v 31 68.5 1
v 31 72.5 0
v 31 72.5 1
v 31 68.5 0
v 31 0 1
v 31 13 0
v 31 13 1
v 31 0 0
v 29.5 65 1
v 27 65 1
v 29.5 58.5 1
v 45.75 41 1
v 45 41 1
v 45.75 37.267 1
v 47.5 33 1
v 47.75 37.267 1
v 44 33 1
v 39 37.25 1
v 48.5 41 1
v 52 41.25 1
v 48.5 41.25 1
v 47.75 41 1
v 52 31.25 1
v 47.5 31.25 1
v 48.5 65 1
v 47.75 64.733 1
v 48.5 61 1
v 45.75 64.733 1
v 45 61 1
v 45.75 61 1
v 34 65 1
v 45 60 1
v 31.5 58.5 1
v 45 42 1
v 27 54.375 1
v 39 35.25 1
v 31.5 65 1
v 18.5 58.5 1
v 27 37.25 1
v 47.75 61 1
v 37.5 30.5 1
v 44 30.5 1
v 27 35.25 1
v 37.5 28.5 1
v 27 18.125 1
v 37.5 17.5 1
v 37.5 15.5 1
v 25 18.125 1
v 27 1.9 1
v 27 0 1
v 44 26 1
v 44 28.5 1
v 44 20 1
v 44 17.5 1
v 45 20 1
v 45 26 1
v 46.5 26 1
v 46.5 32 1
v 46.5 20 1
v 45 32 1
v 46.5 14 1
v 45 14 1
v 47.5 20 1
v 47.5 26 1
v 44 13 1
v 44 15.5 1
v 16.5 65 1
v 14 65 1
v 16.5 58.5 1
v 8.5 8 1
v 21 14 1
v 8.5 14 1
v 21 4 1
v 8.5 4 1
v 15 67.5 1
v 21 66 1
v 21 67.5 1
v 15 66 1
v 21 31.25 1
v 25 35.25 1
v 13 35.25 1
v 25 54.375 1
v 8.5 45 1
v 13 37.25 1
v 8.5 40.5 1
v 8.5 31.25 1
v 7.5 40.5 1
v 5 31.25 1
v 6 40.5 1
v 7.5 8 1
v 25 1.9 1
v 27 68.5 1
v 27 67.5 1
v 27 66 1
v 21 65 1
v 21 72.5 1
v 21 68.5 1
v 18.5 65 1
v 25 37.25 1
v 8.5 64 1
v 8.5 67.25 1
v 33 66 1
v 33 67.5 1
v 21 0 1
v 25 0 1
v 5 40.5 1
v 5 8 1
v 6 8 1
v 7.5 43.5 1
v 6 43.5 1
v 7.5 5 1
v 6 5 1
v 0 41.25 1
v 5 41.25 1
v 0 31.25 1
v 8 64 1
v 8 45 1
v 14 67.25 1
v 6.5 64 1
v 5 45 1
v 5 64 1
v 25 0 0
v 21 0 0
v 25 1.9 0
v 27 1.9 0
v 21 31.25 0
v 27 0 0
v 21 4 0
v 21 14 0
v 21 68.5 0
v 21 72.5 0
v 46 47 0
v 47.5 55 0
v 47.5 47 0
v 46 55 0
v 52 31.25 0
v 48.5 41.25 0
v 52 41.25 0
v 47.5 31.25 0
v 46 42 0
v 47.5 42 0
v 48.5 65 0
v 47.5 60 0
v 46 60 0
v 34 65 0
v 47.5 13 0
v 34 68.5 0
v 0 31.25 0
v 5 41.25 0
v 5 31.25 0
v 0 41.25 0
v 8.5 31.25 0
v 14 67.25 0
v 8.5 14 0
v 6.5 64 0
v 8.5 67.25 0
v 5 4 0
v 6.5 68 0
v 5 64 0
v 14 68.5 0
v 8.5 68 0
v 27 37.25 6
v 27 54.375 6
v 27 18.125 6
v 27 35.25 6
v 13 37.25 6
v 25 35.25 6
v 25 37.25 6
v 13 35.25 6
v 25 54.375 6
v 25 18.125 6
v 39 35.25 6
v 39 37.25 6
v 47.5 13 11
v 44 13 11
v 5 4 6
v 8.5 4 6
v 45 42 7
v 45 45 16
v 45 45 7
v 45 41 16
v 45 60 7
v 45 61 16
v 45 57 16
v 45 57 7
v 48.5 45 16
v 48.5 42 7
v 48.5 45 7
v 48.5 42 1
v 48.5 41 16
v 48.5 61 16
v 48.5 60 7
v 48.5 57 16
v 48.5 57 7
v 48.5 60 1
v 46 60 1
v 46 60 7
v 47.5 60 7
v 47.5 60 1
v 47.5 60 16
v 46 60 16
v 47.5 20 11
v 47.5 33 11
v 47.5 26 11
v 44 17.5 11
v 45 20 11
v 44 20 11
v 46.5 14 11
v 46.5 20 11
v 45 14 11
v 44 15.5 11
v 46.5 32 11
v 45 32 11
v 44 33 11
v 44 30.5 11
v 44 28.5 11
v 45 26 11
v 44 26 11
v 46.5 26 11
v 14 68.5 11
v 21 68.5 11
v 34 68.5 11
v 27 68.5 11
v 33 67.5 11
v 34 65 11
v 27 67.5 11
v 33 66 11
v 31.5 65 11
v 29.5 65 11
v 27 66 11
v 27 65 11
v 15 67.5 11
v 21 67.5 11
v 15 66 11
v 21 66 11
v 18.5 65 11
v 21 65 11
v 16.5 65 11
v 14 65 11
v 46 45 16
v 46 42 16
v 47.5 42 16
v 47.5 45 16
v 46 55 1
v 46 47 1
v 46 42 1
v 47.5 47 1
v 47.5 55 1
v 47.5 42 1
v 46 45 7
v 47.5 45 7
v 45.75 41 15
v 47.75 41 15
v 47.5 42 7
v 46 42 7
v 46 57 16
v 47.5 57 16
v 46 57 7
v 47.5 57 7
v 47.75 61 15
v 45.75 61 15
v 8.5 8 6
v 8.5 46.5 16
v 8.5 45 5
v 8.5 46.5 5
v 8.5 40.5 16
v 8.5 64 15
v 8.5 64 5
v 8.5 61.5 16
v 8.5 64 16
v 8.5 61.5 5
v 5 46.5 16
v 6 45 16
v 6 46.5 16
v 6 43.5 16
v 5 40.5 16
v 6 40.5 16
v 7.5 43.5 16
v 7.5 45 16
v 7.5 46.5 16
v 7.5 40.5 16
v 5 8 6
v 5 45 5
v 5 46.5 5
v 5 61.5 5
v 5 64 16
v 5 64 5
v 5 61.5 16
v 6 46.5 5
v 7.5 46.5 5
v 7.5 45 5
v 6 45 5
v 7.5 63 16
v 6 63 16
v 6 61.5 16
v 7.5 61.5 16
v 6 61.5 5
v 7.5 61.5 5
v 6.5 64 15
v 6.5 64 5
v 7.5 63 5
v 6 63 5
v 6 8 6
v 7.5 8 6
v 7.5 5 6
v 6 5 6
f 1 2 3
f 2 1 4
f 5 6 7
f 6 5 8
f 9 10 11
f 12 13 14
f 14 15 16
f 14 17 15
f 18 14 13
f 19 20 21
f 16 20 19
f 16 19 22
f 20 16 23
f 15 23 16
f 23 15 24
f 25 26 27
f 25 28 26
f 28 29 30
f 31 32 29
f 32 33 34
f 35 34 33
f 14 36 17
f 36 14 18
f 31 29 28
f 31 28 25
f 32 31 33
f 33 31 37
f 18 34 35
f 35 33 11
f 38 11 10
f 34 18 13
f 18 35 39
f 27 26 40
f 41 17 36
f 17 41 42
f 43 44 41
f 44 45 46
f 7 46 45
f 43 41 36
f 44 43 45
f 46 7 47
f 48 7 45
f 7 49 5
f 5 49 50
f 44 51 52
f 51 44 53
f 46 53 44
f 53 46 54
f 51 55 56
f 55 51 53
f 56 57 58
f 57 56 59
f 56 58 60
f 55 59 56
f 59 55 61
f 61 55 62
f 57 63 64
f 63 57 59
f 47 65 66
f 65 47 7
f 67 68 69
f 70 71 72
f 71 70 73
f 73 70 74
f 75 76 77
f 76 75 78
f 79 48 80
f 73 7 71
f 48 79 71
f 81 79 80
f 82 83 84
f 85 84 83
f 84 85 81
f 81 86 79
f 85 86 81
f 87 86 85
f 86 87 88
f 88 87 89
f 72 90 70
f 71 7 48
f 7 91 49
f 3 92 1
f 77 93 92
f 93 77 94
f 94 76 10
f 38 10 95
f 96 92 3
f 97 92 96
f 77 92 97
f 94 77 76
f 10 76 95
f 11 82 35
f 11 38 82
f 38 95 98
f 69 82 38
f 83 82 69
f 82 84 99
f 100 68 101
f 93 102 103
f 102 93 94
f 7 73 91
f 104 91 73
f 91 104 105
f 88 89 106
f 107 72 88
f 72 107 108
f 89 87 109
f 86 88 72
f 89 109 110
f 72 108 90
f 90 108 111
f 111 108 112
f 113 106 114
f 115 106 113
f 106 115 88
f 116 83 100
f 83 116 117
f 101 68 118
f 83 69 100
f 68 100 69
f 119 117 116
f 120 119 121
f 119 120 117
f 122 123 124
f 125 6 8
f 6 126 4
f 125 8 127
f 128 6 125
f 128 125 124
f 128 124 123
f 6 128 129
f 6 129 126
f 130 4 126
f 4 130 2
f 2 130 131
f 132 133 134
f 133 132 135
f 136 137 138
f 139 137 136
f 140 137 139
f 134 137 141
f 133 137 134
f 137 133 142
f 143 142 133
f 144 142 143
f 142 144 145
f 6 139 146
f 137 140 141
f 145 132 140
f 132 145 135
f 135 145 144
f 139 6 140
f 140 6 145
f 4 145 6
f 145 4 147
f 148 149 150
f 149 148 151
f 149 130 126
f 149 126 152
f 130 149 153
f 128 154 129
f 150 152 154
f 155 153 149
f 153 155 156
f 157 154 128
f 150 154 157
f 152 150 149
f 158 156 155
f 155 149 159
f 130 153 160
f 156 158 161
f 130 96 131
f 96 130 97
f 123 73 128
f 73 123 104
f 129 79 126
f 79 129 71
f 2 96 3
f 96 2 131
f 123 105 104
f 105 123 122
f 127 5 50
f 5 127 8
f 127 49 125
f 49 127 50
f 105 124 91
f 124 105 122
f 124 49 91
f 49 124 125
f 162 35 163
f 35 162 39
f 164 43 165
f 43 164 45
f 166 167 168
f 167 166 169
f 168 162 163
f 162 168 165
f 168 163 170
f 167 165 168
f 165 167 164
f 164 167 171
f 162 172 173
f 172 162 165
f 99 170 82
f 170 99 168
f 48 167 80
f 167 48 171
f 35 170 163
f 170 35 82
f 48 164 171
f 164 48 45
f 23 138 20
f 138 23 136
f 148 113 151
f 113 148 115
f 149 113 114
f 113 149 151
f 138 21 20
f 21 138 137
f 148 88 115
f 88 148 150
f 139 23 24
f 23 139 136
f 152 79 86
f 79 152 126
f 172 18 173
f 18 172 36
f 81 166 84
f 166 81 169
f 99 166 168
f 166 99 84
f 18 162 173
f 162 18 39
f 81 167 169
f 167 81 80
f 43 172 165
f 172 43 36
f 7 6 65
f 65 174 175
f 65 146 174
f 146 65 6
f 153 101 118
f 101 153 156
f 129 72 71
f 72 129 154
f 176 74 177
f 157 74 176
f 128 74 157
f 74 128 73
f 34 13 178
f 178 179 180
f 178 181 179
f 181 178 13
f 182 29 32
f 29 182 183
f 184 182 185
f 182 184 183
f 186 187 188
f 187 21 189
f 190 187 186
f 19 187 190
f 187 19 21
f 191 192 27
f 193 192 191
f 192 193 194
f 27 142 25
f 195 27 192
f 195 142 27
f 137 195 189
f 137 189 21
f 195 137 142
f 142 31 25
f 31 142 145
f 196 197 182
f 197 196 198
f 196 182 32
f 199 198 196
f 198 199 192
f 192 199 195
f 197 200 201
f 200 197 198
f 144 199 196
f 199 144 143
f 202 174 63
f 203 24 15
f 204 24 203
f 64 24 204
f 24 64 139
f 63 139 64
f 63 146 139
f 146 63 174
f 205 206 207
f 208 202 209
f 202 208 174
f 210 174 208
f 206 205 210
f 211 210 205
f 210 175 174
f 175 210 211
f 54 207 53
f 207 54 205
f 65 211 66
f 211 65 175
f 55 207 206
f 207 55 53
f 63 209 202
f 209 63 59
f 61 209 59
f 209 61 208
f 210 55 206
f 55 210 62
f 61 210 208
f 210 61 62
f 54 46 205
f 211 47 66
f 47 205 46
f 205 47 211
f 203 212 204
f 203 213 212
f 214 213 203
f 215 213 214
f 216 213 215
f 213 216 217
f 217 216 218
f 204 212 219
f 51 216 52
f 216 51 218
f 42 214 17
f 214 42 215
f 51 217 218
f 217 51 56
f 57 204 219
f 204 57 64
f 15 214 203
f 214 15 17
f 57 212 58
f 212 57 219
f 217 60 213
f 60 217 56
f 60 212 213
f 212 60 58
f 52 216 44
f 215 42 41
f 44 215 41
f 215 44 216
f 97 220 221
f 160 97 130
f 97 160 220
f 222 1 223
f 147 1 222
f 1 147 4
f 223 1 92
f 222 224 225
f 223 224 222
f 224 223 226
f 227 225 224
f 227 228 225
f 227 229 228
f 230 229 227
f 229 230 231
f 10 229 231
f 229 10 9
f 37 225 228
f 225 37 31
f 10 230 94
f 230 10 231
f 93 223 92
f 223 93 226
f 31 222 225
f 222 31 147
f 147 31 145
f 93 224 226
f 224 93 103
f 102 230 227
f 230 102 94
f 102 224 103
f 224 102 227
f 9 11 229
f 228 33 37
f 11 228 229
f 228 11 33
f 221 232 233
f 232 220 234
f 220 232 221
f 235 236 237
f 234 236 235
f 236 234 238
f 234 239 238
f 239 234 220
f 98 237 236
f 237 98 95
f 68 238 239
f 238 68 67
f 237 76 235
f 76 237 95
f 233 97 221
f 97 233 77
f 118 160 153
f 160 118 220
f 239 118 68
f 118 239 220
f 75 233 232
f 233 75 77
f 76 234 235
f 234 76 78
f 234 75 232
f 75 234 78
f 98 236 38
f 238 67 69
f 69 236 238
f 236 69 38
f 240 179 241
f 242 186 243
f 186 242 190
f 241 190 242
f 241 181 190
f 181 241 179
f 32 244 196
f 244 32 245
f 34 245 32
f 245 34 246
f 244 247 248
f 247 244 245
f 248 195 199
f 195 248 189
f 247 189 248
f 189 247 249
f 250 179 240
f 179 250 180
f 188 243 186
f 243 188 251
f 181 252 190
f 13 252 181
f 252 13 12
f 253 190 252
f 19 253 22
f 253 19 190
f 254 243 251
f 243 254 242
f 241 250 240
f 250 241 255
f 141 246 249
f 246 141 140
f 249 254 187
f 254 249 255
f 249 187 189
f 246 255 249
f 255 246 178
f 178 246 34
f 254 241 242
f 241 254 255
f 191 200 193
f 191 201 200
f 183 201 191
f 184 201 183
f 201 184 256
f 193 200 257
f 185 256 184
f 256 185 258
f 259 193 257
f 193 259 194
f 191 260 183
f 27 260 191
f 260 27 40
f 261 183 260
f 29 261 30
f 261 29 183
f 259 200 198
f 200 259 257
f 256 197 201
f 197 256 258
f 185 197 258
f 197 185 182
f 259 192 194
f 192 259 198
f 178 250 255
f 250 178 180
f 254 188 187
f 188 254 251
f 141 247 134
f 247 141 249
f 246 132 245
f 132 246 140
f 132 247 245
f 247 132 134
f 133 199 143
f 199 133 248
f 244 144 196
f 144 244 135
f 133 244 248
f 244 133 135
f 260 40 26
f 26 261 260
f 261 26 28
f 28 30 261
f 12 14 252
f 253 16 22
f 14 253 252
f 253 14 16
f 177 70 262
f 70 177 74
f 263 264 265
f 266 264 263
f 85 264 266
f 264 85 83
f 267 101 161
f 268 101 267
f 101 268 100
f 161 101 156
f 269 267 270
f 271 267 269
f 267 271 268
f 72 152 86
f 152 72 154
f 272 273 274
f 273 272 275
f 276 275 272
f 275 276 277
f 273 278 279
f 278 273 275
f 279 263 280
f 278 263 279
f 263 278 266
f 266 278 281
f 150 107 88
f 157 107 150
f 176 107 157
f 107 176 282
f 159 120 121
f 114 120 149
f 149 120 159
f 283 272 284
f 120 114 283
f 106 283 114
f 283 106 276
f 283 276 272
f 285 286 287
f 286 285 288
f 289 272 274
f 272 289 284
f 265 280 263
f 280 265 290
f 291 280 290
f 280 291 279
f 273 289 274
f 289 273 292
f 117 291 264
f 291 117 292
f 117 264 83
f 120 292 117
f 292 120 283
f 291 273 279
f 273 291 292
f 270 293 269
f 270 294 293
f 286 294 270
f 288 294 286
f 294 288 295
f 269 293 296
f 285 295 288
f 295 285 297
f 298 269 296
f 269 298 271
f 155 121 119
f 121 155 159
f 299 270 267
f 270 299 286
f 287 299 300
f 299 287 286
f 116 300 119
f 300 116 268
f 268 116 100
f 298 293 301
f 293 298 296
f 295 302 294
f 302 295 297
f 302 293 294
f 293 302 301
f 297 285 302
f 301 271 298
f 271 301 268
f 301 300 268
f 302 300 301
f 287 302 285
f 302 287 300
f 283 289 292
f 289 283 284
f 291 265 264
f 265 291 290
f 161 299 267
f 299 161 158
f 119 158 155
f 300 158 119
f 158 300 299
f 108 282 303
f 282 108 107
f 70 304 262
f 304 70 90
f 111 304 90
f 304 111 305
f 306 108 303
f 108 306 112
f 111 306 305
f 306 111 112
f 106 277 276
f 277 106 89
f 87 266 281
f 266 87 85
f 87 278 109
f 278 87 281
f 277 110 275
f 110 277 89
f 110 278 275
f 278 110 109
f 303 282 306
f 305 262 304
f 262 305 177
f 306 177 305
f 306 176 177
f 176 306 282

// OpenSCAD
// file: button_holder.scad
button_holder(
    button_width = 7,
    slot_depth = 6,
    slot_width = 2,
    slot_wall_width = 1,
    height = 15,
    base_thickness = 1,
    base_width = 10
);

module button_holder(
    button_width,
    slot_depth,
    slot_width,
    slot_wall_width,
    height,
    base_thickness,
    base_width
) {
    slot_size = button_width + slot_depth * 2;

    slot_sup_len = base_width - (slot_width + 2);

    translate([-slot_sup_len, 0, 0])
        cube([base_width, slot_size, base_thickness]);

    translate([0, 0, base_thickness]) {
        tslot(
            slot_width = slot_width,
            slot_depth = slot_depth,
            slot_height = height,
            slot_wall_width = slot_wall_width,
            support_base_length = slot_sup_len
        );

        translate([0, 20, 0]) {
            mirror([0, 1, 0]) {
                tslot(
                    slot_width = slot_width,
                    slot_depth = slot_depth,
                    slot_height = height,
                    slot_wall_width = slot_wall_width,
                    support_base_length = slot_sup_len
                );
            }
        }
    }
}

module tslot(
    slot_width,
    slot_depth,
    slot_height,
    slot_wall_width,
    support_base_length,
    use_sup = true
) {

    support_width = 2;

    difference() {
        cube([slot_width + slot_wall_width * 2, slot_depth + slot_wall_width, slot_height]);

        translate([slot_wall_width, slot_wall_width, -.5])
            cube([slot_width, slot_depth + 1, slot_height + 1]);
    }

    if (use_sup) {
        translate([0, support_width/2 + (slot_depth + slot_wall_width)/2, 0]) {
            rotate([0, -90, 90]) {
                linear_extrude(support_width) {
                    polygon([[0, 0], [0, support_base_length], [slot_height, 0]]);
                }
            }
        }
    }
}
// main file
use <button_holder.scad>

render_case_perimeter = false;

case_height = 52;
case_width = 72.5;
base_thickness = 1;

top_button_x = 44;
top_button_y = 23;

side_button_x = 24;
side_button_y = 65;

charger_pcb_holder_x = 45;
charger_pcb_holder_y = 41;

sd_pcb_holder_x = 5;
sd_pcb_holder_y = 44;

rtc_pcb_holder_x = 5;
rtc_pcb_holder_y = 4;


button_holder_height = 10;
button_width = 8;
button_slot_depth = 6;
button_slot_width = 1.5;

// Main bottom plate
base_plate(
    size = [case_height, case_width, base_thickness],
    outer_wall_width = 2,
    line_thickness = 1,
    line_spacing = 10,
    render_case_perimeter = render_case_perimeter
);

button_holder_width = button_width + button_slot_depth * 2;

// Top button holder
translate([top_button_x, top_button_y - (button_holder_width / 2), 0]) {
    button_holder(
        button_width = button_width,
        slot_depth = button_slot_depth,
        slot_width = button_slot_width,
        slot_wall_width = 1,
        height = button_holder_height,
        base_thickness = base_thickness,
        base_width = 10
    );
}

// Side button holder
translate([side_button_x + (button_holder_width / 2), side_button_y, 0]) {
    rotate([0, 0, 90]) {
        button_holder(
            button_width = button_width,
            slot_depth = button_slot_depth,
            slot_width = button_slot_width,
            slot_wall_width = 1,
            height = button_holder_height,
            base_thickness = base_thickness,
            base_width = 10
        );
    }
}

// Charger holder
translate([charger_pcb_holder_x, charger_pcb_holder_y, 0]) {
    charger_pcb_width = 18;
    charger_pcb_holder_height = 15;
    difference() {
        pcb_holder(
            pcb_length = charger_pcb_width,
            slot_depth = 3,
            slot_width = 1.5,
            slot_wall_width = 1,
            height = charger_pcb_holder_height,
            base_thickness = base_thickness,
            base_width = 10
        );
        // Cutout for pads
        translate([-1, 1, base_thickness]) 
            cube([6, charger_pcb_width, 6]);

        // Cutout for feet
        translate([1, 1, -3]) 
            cube([1.5, 5, 6]);

        // Cutout for feet
        translate([1, charger_pcb_width-4, -3]) 
            cube([1.5, 5, 6]);

    }

    // Support
    translate([2.75, charger_pcb_width + 2, 0]) {
        rotate([0, -90, 0]) {
            linear_extrude(2) {
                polygon([[0, 0], [0, 4], [charger_pcb_holder_height, 0]]);
            }
        }
    }
    translate([0.75, 0, 0]) {
        rotate([0, -90, 180]) {
            linear_extrude(2) {
                polygon([[0, 0], [0, 4], [charger_pcb_holder_height, 0]]);
            }
        }
    }
}

// SD holder
translate([sd_pcb_holder_x, sd_pcb_holder_y, 0]) {
    sd_pcb_width = 18;
    sd_pcb_holder_height = 15;
    difference() {
        pcb_holder(
            pcb_length = sd_pcb_width,
            slot_depth = 1.5,
            slot_width = 1.5,
            slot_wall_width = 1,
            height = sd_pcb_holder_height,
            base_thickness = base_thickness,
            base_width = 10
        );
        translate([-1, 1, base_thickness]) 
            cube([6, sd_pcb_width+1, 4]);
    }
    // Support
    translate([3.5, sd_pcb_width + 2, 0]) {
        rotate([0, -90, 0]) {
            linear_extrude(2) {
                polygon([[0, 0], [0, 4], [sd_pcb_holder_height, 0]]);
            }
        }
    }
}

// RTC holder
translate([rtc_pcb_holder_x, rtc_pcb_holder_y, 0]) {
    rtc_pcb_width = 38.5;
    difference() {
        pcb_holder(
            pcb_length = rtc_pcb_width,
            slot_depth = 3,
            slot_width = 1.5,
            slot_wall_width = 1,
            height = 15,
            base_thickness = base_thickness,
            base_width = 10
        );

        translate([-1, -1, base_thickness+5]) 
            cube([6, 6, 15]);
    }
}

module pcb_holder (
    pcb_length,
    slot_depth,
    slot_width,
    slot_wall_width,
    height,
    base_thickness,
    base_width
) {
    //slot_size = button_width + slot_depth * 2;

    slot_sup_len = base_width - (slot_width + 2);

    cube([slot_width + 2*slot_wall_width, pcb_length + slot_wall_width*2, base_thickness]);

    translate([0, 0, base_thickness]) {
        tslot(
            slot_width = slot_width,
            slot_depth = slot_depth,
            slot_height = height,
            slot_wall_width = slot_wall_width,
            support_base_length = slot_sup_len,
            use_sup = false
        );

        translate([0, pcb_length + slot_wall_width*2, 0]) {
            mirror([0, 1, 0]) {
                tslot(
                    slot_width = slot_width,
                    slot_depth = slot_depth,
                    slot_height = height,
                    slot_wall_width = slot_wall_width,
                    support_base_length = slot_sup_len,
                    use_sup=false
                );
            }
        }
    }
}



// Create the crosshatch pattern as a cutout
module base_plate(
    size,
    outer_wall_width,
    line_thickness,
    line_spacing,
    render_case_perimeter = false
) {
    main_sup_width = 10;

    // Main supports
    translate([size[0]/2-main_sup_width/2, 0, 0]) {

        // Temp support to keep base from bending
        translate([main_sup_width/2-1, size[1]/4, base_thickness]) 
            cube([2, size[1]/2, 5]);

        difference () {
            cube([main_sup_width, size[1], size[2]]);
            translate([main_sup_width/2-1, -.1, -base_thickness/2])
                cube([2, 2, base_thickness * 2]);
        }
    }
    translate([0, size[1]/2-main_sup_width/2, 0]) {
        cube([size[0], main_sup_width, size[2]]);

        // Temp support to keep base from bending
        translate([size[0]/2*.5, main_sup_width/2-1, base_thickness])
            cube([size[0]/2, 2, 5]);
    }

    // Supports:

    // Top button holder connector
    translate([size[0]/2, 13, 0]) {
        cube([size[0]/3, 20, size[2]]);
    }

    // SD card holder support
    translate([8, size[1]/2, 0]) {
        cube([14, 31, size[2]]);
    }

    // RTC holder support
    translate([8, 4, 0]) {
        cube([15, 10, size[2]]);
    }

    // Power holder support
    translate([30, 30, 0])
        cube([15, 32, size[2]]);

    translate([33.5, 60, 0])
        cube([15, 5, size[2]]);

    // Outer wall
    if (render_case_perimeter) {
        difference() {
            cube(size);
            translate([outer_wall_width, outer_wall_width, -size[2]/2])
                cube([size[0] - 2*outer_wall_width, size[1] - 2*outer_wall_width, size[2]*2]);
        }
    }
/*
    // First set of parallel lines
    for (i = [0:line_spacing:size[0]-line_spacing]) {
        translate([i, 0, 0])
        cube([line_thickness, size[1], size[2]]);
    }
    // Second set of parallel lines
    for (i = [0:line_spacing:size[1]-line_spacing]) {
        translate([0, i, 0])
        cube([size[0], line_thickness, size[2]]); // Thin cube to act as a line
    }
    */
}
